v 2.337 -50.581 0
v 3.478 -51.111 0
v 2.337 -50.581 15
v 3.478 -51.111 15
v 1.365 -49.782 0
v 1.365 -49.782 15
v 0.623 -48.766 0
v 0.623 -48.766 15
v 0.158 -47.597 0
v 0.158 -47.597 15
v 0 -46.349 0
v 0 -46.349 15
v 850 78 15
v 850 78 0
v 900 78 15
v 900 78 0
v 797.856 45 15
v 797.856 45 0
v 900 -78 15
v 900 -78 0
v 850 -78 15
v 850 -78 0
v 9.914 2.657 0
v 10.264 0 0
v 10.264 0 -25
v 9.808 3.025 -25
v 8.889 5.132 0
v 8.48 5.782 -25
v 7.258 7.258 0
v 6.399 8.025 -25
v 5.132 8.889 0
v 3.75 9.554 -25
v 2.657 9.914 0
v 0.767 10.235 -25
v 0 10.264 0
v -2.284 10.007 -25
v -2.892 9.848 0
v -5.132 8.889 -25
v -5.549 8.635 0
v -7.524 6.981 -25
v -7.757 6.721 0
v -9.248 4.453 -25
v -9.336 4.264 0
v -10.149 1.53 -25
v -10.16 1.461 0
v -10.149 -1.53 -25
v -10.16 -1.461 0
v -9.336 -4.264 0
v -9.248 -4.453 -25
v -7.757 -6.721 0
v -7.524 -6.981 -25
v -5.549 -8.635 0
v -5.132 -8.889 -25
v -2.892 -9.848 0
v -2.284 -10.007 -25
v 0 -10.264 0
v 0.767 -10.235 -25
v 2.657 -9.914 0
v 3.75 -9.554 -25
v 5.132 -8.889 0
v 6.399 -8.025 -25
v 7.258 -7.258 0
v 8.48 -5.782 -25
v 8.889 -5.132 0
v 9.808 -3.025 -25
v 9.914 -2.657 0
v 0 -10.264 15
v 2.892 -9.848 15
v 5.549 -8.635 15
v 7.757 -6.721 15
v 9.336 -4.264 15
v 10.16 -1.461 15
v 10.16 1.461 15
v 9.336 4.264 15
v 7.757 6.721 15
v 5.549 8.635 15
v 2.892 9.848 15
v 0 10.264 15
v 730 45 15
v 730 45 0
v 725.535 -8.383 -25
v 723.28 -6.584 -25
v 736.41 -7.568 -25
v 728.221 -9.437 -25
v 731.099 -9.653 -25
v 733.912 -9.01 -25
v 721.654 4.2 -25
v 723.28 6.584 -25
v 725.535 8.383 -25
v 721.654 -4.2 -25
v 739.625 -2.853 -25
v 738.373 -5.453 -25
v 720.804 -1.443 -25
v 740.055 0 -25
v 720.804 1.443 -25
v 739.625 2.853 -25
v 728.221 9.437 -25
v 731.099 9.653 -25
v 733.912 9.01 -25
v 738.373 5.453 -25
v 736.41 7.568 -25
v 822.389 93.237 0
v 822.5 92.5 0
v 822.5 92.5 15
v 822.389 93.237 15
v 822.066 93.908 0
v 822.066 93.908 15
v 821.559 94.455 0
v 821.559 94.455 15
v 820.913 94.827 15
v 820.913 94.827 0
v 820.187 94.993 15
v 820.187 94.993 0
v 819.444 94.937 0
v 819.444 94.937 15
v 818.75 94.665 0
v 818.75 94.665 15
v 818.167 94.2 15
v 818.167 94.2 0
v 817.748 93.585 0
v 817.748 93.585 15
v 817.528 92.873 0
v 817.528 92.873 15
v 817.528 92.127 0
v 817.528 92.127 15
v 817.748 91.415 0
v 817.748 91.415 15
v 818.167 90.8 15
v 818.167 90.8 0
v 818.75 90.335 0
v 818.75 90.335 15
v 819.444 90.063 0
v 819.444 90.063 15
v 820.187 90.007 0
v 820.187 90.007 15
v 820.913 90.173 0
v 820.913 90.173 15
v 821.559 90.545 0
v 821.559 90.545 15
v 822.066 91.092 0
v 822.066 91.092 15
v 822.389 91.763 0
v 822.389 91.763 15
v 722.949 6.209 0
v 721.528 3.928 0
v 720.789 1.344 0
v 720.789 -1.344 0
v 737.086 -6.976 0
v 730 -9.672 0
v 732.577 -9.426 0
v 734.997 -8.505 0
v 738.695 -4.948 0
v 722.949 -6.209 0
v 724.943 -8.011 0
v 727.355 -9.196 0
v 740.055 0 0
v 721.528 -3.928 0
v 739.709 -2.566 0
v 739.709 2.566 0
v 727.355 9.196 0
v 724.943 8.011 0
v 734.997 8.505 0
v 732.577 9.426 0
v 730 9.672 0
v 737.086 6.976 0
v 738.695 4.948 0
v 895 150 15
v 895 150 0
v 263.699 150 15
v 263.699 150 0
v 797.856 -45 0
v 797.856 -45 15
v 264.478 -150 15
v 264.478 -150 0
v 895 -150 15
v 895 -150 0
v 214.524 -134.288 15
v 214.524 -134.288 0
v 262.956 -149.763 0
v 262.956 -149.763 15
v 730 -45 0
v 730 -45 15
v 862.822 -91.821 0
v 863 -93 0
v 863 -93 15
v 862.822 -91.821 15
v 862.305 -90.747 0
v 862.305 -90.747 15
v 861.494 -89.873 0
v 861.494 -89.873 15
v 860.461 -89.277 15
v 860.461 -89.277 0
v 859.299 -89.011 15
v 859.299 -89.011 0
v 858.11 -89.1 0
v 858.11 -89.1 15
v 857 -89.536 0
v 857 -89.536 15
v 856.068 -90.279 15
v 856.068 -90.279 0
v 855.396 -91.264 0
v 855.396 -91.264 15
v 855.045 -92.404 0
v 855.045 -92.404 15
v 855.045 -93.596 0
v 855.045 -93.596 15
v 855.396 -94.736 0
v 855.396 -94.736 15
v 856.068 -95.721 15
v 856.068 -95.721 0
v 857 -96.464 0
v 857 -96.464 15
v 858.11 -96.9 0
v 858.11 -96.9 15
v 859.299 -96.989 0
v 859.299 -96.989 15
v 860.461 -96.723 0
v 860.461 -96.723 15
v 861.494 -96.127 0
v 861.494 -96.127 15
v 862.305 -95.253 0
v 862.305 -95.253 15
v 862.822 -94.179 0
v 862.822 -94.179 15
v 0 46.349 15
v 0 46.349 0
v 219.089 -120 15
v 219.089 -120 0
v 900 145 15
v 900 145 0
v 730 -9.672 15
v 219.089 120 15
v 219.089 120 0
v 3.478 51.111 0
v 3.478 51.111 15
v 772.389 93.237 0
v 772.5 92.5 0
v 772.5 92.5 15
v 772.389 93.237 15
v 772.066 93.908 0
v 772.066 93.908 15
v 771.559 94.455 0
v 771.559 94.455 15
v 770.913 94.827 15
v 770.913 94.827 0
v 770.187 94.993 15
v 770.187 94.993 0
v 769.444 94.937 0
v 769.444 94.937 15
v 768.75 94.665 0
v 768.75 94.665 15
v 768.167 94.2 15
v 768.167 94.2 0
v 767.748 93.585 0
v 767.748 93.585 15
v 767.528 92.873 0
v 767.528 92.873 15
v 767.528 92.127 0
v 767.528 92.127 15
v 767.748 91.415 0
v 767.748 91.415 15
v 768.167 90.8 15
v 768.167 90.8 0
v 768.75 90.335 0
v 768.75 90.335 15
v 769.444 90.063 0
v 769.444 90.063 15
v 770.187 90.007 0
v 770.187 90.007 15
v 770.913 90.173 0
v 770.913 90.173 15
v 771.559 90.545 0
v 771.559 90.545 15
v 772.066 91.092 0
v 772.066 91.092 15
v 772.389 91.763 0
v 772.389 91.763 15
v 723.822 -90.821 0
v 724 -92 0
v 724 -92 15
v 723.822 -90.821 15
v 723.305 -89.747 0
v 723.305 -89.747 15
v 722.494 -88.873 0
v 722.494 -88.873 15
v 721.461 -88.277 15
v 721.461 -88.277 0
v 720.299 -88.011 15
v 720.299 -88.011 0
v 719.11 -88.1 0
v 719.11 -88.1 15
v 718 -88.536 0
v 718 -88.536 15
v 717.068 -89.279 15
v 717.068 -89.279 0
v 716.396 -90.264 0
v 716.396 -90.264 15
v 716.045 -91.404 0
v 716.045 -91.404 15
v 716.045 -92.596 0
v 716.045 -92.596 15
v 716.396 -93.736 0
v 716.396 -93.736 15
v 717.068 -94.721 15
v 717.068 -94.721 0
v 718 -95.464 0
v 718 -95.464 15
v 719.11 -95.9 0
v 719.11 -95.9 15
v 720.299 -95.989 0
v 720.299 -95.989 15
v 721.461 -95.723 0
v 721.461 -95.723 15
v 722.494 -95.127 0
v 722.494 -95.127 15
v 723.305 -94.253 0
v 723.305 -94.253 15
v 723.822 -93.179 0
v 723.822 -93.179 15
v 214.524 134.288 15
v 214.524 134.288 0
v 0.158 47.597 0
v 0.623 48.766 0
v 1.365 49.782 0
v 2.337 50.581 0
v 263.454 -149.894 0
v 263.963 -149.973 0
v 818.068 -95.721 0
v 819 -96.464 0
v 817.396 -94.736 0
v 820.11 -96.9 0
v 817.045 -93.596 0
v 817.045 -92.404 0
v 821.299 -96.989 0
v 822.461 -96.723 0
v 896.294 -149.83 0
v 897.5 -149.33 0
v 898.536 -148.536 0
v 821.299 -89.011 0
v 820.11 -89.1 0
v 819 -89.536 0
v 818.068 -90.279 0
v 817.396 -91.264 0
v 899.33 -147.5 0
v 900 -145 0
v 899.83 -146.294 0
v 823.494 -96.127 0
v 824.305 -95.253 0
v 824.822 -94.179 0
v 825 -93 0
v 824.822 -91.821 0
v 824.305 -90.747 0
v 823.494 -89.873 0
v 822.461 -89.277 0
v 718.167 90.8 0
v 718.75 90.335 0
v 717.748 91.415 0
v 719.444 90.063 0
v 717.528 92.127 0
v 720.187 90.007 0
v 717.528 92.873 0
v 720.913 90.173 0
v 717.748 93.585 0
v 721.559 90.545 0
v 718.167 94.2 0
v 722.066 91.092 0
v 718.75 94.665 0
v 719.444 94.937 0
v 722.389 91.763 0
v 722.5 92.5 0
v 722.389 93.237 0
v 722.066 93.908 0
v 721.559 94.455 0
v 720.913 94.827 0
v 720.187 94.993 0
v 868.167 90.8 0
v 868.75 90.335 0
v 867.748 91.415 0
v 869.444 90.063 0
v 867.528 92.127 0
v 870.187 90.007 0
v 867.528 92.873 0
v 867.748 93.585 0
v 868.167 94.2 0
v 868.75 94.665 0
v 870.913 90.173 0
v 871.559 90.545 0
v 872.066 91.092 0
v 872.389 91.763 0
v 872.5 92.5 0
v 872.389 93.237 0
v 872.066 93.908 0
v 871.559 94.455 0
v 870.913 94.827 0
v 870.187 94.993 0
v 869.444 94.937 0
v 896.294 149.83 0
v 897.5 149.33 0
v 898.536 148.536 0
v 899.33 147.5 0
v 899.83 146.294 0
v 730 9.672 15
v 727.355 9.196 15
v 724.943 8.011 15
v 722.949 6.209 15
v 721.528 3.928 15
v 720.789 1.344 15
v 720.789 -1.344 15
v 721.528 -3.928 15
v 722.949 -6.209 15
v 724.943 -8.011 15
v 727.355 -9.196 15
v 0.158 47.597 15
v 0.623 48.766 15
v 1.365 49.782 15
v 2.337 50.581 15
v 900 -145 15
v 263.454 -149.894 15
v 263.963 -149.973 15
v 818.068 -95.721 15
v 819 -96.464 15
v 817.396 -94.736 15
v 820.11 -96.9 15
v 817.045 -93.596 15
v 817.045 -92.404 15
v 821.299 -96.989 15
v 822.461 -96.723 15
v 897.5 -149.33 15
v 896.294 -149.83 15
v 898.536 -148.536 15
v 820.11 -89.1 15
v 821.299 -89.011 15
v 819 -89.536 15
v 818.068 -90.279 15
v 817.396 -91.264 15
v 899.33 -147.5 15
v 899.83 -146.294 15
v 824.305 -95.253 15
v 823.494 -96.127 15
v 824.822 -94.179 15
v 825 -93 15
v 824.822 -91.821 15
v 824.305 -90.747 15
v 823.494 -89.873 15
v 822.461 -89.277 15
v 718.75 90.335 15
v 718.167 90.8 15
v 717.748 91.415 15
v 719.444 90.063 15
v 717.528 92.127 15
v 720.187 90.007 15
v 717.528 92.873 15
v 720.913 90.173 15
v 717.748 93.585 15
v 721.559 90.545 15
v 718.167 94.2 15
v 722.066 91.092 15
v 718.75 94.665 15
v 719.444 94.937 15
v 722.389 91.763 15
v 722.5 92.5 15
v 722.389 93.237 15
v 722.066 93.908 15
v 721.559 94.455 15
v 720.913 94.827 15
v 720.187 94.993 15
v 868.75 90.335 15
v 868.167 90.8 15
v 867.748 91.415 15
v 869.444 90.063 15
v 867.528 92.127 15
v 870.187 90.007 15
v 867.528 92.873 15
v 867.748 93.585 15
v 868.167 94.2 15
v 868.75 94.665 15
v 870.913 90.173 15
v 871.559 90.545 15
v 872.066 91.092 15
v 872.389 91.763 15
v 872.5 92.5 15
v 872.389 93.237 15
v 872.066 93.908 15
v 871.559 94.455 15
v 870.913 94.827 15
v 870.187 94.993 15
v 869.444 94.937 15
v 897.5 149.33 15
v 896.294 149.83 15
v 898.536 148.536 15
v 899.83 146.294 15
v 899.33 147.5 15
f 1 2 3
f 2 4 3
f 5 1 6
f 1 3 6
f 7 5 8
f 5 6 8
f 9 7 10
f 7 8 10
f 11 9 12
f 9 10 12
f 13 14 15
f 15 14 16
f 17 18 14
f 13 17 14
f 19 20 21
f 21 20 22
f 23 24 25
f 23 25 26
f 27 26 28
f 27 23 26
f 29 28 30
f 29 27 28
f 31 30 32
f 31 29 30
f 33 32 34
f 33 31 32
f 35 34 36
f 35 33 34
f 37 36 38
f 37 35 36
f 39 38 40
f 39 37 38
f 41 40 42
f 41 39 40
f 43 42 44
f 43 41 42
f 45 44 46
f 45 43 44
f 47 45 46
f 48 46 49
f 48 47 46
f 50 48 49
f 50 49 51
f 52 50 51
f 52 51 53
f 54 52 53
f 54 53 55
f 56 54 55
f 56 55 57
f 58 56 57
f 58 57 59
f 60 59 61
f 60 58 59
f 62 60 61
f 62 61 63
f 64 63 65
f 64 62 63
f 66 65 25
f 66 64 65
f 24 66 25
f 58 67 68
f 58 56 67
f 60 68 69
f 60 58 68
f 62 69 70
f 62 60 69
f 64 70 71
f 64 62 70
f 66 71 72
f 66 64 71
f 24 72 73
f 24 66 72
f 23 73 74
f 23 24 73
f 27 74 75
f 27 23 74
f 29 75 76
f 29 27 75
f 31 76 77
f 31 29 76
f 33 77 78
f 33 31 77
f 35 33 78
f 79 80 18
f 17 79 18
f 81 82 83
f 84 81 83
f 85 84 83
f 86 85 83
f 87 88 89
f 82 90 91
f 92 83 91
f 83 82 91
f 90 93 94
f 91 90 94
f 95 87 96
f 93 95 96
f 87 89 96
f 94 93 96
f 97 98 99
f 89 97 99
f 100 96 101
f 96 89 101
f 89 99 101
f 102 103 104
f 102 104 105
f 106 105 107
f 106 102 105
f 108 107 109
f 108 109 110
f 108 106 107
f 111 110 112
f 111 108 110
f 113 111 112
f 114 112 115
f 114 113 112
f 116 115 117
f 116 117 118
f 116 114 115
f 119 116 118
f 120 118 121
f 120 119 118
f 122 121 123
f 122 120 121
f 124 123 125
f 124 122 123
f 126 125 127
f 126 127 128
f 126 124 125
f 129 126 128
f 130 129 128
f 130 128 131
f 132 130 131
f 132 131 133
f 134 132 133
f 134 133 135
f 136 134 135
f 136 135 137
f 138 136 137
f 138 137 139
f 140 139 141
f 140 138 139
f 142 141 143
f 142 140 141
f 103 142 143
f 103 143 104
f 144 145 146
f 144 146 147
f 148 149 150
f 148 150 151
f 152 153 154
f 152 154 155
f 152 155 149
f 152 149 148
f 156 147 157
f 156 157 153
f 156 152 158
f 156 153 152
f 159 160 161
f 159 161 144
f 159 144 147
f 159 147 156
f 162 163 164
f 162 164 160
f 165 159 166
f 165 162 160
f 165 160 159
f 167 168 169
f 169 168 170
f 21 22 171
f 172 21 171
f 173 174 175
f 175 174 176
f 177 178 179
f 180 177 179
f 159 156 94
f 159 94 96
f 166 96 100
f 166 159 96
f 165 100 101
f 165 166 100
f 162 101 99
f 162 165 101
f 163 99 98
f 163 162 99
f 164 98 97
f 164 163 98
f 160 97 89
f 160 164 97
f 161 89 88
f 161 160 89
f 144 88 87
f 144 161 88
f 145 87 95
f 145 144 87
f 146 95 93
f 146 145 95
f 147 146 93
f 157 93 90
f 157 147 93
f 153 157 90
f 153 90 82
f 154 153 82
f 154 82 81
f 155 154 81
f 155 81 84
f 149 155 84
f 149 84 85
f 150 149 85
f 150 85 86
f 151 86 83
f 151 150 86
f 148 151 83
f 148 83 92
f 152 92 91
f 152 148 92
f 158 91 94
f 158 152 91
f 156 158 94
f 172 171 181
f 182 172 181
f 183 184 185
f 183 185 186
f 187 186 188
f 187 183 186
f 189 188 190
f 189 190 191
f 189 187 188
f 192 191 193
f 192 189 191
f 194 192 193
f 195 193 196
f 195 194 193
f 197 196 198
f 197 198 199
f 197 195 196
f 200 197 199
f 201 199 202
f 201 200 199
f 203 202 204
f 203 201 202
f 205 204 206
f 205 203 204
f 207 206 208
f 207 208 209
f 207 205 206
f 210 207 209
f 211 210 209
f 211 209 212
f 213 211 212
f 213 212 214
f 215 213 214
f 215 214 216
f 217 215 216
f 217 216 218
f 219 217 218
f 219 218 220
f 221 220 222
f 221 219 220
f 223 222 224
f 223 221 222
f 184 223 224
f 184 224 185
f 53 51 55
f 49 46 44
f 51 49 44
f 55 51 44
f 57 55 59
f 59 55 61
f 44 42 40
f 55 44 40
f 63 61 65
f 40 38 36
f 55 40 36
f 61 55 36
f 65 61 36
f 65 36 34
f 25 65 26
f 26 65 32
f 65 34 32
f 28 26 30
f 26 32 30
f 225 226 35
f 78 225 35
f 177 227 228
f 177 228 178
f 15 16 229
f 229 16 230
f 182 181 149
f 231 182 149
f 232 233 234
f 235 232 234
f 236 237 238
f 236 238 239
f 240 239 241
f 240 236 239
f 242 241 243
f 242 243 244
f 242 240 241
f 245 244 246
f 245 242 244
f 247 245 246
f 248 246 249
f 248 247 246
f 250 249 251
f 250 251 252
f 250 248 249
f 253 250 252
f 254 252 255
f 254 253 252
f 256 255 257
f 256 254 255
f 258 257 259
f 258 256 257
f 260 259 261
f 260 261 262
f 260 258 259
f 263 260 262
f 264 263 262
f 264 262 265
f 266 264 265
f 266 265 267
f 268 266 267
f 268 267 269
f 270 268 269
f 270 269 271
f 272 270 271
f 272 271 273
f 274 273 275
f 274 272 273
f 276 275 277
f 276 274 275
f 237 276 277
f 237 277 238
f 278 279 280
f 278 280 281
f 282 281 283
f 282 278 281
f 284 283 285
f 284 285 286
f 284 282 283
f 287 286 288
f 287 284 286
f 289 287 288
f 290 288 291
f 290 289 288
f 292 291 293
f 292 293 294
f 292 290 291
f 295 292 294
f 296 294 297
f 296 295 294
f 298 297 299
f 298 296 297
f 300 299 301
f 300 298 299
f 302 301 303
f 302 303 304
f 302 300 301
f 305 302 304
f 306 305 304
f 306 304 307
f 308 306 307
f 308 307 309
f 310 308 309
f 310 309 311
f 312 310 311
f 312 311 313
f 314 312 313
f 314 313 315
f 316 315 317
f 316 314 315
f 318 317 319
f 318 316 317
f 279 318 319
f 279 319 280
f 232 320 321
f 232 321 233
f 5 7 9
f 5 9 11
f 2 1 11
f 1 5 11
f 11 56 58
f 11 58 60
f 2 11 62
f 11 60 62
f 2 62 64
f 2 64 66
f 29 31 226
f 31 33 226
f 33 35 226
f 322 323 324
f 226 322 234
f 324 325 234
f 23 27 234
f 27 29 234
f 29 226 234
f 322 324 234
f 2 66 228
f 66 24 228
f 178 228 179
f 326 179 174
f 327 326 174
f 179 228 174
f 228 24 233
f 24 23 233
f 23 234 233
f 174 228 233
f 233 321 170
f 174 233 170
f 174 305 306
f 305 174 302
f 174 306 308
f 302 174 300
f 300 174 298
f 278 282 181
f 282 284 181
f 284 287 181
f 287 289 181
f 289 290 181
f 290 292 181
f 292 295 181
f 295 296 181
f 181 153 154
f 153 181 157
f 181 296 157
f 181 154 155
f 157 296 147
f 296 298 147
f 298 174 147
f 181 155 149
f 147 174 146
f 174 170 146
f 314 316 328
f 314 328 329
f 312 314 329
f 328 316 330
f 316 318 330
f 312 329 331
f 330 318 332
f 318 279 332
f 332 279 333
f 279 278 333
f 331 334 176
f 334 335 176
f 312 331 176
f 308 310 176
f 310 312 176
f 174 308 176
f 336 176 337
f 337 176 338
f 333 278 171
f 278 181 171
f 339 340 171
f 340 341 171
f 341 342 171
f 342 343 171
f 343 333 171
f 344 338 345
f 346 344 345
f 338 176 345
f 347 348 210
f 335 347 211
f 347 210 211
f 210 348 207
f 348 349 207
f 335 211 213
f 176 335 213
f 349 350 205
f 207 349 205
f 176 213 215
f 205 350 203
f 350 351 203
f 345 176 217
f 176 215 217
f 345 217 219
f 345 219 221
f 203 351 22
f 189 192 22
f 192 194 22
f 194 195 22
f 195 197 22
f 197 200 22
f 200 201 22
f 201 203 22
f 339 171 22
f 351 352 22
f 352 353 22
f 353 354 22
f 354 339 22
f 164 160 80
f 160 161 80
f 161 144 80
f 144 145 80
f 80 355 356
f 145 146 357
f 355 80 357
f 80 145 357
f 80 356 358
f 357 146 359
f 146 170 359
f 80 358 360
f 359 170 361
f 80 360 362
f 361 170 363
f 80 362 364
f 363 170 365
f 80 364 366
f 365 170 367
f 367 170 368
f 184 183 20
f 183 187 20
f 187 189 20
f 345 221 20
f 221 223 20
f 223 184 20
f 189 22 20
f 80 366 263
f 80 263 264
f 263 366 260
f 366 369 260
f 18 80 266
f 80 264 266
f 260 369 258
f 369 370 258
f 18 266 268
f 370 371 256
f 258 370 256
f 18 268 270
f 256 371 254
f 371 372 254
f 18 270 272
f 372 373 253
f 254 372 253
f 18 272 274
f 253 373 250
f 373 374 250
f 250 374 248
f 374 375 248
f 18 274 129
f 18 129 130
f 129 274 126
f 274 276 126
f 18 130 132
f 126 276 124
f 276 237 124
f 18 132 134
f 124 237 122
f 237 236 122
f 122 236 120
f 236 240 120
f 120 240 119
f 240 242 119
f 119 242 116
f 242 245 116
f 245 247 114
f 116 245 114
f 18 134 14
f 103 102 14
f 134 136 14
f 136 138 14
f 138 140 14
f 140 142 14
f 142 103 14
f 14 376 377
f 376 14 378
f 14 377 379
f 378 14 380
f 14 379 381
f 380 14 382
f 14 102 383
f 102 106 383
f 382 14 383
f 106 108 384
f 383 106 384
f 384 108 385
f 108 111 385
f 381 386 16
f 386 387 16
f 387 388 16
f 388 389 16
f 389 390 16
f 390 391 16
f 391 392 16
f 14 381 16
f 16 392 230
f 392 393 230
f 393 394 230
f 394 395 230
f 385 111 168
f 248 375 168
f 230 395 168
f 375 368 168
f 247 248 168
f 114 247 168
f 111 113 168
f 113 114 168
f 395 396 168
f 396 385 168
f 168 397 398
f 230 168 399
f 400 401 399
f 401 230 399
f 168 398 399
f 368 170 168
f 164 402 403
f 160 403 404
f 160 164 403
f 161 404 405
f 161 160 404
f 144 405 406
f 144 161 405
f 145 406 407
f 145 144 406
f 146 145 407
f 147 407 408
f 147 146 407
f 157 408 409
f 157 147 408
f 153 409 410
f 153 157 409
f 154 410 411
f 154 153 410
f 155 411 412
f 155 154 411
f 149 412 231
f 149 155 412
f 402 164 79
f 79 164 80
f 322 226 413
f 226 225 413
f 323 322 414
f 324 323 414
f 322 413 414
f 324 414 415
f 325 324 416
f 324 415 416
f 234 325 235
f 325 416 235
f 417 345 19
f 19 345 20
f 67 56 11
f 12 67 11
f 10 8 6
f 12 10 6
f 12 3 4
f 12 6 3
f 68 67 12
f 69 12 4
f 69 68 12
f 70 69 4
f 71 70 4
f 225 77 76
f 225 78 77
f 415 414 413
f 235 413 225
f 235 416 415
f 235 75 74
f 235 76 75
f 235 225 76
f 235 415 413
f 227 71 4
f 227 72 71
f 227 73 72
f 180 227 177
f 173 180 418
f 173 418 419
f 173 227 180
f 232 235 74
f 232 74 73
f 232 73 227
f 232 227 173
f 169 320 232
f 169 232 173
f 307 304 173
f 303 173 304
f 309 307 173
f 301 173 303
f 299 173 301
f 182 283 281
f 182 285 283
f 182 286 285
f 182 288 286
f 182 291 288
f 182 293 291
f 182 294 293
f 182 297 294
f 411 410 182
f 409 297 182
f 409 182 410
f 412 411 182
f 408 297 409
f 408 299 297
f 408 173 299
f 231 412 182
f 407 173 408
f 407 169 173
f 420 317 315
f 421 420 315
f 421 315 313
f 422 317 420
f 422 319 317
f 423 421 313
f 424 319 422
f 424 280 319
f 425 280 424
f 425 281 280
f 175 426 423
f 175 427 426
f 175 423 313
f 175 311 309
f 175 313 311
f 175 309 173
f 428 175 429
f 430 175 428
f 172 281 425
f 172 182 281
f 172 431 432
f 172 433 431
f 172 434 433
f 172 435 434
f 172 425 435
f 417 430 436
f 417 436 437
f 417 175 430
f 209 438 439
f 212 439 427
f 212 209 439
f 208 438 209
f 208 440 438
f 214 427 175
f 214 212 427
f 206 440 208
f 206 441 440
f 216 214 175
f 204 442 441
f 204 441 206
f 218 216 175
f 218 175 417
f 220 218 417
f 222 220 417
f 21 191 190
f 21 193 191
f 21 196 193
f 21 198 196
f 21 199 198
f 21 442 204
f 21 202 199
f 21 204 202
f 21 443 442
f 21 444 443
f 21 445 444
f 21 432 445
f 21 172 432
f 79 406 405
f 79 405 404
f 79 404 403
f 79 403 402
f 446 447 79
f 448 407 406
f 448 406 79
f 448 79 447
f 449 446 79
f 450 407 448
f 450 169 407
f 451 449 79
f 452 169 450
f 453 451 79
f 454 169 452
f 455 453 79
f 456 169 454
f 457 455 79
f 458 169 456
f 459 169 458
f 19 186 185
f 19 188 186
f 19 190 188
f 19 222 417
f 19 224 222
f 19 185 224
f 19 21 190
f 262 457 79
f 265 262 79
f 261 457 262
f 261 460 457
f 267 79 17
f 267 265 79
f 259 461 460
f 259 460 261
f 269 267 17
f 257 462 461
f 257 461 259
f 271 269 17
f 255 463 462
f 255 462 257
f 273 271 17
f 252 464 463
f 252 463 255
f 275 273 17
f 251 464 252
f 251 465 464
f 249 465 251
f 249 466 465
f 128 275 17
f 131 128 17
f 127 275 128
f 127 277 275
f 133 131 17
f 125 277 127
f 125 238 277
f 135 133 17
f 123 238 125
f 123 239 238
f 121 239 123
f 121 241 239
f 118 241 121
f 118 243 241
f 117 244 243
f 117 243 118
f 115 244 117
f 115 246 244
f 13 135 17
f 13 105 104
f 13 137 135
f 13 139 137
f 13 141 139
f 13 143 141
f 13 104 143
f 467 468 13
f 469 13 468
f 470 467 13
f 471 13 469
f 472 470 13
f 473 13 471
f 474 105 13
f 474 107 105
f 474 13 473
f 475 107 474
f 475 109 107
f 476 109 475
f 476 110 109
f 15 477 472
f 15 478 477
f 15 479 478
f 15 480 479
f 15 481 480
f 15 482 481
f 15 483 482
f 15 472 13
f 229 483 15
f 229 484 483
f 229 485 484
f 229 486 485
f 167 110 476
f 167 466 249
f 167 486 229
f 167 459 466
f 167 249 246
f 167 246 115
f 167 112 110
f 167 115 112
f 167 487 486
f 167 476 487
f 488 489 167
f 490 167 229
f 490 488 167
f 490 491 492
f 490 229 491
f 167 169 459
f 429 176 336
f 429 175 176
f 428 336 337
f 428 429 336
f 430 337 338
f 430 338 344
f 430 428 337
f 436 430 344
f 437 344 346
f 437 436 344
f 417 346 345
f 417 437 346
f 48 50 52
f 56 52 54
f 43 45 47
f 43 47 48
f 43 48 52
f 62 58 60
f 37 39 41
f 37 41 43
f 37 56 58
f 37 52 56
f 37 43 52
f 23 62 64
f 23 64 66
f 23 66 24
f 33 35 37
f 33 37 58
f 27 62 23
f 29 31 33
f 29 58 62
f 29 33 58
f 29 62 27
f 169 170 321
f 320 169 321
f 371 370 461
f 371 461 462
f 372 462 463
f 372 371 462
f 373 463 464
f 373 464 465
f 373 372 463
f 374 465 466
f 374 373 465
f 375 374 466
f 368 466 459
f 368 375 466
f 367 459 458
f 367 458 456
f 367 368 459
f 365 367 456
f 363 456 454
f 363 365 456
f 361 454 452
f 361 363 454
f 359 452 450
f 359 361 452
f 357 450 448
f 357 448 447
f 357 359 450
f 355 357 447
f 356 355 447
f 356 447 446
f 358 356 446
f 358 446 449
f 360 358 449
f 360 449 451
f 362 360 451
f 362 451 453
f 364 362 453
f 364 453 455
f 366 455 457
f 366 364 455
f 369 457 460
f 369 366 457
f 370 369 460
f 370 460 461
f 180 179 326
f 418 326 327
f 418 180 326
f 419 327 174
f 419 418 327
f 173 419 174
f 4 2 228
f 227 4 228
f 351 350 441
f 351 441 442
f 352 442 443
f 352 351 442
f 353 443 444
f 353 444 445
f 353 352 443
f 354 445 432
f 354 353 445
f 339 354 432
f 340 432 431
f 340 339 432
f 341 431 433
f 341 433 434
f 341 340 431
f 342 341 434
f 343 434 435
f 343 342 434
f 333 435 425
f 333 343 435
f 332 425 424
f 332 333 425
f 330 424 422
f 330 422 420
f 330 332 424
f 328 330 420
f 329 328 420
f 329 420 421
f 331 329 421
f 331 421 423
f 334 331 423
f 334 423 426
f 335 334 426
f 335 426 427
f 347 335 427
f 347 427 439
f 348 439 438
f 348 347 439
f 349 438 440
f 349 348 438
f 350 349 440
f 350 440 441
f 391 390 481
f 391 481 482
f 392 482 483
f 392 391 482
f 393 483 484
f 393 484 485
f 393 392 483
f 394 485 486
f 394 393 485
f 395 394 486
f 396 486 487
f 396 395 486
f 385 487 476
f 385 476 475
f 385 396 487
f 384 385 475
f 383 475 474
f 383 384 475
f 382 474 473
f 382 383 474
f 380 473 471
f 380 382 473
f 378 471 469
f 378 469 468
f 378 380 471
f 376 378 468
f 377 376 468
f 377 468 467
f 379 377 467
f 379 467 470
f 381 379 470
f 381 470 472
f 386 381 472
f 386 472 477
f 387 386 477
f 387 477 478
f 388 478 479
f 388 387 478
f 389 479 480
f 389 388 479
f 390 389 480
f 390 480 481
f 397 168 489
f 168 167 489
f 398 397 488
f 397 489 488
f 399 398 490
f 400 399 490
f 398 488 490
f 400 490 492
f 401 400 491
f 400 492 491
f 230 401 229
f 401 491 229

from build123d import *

# Parameters (mm, degrees)
F0_R     = 4
F0_R_2   = 2.5
F1_DEPTH = 15
F2_R     = 5
F3_R     = 5
F4_R     = 5
F5_R     = 10.2639763847
F5_R_2   = 9.6795888004
F6_DEPTH = 25
F7_DEPTH = 25


# Not quite as in the source:
# - a feature names something its author has since deleted; it is built from what else it names


with BuildPart() as f1:
    # F0 (on Top) → F1 (new body)
    with BuildSketch(Plane.XY):
        Polygon((0, 50), (0, 0), (0, -50), (219.0890230021, -120), (214.5238056108, -134.2884145436), (263.6986042887, -150), (900, -150), (900, -78), (850, -78), (797.8563520055, -45), (785, -45), (730, -45), (730, 45), (785, 45), (797.8563520055, 45), (850, 78), (900, 78), (900, 150), (263.6986042887, 150), (214.5238056108, 134.2884145436), (219.0890230021, 120), align=None)
        with Locations((720, -92)):
            Circle(F0_R, mode=Mode.SUBTRACT)
        with Locations((821, -93)):
            Circle(F0_R, mode=Mode.SUBTRACT)
        with Locations((859, -93)):
            Circle(F0_R, mode=Mode.SUBTRACT)
        with Locations((720, 92.5)):
            Circle(F0_R_2, mode=Mode.SUBTRACT)
        with Locations((770, 92.5)):
            Circle(F0_R_2, mode=Mode.SUBTRACT)
        with Locations((820, 92.5)):
            Circle(F0_R_2, mode=Mode.SUBTRACT)
        with Locations((870, 92.5)):
            Circle(F0_R_2, mode=Mode.SUBTRACT)
    extrude(amount=F1_DEPTH)

    # F2
    f2_edges = [f1.edges().sort_by_distance(p)[0] for p in [
        (263.698604, -150, 7.5),
    ]]
    fillet(f2_edges, radius=F2_R)

    # F3
    f3_edges = [f1.edges().sort_by_distance(p)[0] for p in [
        (0, -50, 7.5),
        (0, 50, 7.5),
    ]]
    fillet(f3_edges, radius=F3_R)

    # F4
    f4_edges = [f1.edges().sort_by_distance(p)[0] for p in [
        (900, 150, 7.5),
        (900, -150, 7.5),
    ]]
    fillet(f4_edges, radius=F4_R)

    # F5 (on Top) → F6 (cut)
    with BuildSketch(Plane.XY):
        Circle(F5_R)
        with Locations((730.375289917, 0)):
            Circle(F5_R_2)
    extrude(amount=F6_DEPTH, mode=Mode.SUBTRACT)

    # F5 (on Top) → F7 (join)
    with BuildSketch(Plane.XY):
        Circle(F5_R)
        with Locations((730.375289917, 0)):
            Circle(F5_R_2)
    extrude(amount=-F7_DEPTH)


solid = f1.part
